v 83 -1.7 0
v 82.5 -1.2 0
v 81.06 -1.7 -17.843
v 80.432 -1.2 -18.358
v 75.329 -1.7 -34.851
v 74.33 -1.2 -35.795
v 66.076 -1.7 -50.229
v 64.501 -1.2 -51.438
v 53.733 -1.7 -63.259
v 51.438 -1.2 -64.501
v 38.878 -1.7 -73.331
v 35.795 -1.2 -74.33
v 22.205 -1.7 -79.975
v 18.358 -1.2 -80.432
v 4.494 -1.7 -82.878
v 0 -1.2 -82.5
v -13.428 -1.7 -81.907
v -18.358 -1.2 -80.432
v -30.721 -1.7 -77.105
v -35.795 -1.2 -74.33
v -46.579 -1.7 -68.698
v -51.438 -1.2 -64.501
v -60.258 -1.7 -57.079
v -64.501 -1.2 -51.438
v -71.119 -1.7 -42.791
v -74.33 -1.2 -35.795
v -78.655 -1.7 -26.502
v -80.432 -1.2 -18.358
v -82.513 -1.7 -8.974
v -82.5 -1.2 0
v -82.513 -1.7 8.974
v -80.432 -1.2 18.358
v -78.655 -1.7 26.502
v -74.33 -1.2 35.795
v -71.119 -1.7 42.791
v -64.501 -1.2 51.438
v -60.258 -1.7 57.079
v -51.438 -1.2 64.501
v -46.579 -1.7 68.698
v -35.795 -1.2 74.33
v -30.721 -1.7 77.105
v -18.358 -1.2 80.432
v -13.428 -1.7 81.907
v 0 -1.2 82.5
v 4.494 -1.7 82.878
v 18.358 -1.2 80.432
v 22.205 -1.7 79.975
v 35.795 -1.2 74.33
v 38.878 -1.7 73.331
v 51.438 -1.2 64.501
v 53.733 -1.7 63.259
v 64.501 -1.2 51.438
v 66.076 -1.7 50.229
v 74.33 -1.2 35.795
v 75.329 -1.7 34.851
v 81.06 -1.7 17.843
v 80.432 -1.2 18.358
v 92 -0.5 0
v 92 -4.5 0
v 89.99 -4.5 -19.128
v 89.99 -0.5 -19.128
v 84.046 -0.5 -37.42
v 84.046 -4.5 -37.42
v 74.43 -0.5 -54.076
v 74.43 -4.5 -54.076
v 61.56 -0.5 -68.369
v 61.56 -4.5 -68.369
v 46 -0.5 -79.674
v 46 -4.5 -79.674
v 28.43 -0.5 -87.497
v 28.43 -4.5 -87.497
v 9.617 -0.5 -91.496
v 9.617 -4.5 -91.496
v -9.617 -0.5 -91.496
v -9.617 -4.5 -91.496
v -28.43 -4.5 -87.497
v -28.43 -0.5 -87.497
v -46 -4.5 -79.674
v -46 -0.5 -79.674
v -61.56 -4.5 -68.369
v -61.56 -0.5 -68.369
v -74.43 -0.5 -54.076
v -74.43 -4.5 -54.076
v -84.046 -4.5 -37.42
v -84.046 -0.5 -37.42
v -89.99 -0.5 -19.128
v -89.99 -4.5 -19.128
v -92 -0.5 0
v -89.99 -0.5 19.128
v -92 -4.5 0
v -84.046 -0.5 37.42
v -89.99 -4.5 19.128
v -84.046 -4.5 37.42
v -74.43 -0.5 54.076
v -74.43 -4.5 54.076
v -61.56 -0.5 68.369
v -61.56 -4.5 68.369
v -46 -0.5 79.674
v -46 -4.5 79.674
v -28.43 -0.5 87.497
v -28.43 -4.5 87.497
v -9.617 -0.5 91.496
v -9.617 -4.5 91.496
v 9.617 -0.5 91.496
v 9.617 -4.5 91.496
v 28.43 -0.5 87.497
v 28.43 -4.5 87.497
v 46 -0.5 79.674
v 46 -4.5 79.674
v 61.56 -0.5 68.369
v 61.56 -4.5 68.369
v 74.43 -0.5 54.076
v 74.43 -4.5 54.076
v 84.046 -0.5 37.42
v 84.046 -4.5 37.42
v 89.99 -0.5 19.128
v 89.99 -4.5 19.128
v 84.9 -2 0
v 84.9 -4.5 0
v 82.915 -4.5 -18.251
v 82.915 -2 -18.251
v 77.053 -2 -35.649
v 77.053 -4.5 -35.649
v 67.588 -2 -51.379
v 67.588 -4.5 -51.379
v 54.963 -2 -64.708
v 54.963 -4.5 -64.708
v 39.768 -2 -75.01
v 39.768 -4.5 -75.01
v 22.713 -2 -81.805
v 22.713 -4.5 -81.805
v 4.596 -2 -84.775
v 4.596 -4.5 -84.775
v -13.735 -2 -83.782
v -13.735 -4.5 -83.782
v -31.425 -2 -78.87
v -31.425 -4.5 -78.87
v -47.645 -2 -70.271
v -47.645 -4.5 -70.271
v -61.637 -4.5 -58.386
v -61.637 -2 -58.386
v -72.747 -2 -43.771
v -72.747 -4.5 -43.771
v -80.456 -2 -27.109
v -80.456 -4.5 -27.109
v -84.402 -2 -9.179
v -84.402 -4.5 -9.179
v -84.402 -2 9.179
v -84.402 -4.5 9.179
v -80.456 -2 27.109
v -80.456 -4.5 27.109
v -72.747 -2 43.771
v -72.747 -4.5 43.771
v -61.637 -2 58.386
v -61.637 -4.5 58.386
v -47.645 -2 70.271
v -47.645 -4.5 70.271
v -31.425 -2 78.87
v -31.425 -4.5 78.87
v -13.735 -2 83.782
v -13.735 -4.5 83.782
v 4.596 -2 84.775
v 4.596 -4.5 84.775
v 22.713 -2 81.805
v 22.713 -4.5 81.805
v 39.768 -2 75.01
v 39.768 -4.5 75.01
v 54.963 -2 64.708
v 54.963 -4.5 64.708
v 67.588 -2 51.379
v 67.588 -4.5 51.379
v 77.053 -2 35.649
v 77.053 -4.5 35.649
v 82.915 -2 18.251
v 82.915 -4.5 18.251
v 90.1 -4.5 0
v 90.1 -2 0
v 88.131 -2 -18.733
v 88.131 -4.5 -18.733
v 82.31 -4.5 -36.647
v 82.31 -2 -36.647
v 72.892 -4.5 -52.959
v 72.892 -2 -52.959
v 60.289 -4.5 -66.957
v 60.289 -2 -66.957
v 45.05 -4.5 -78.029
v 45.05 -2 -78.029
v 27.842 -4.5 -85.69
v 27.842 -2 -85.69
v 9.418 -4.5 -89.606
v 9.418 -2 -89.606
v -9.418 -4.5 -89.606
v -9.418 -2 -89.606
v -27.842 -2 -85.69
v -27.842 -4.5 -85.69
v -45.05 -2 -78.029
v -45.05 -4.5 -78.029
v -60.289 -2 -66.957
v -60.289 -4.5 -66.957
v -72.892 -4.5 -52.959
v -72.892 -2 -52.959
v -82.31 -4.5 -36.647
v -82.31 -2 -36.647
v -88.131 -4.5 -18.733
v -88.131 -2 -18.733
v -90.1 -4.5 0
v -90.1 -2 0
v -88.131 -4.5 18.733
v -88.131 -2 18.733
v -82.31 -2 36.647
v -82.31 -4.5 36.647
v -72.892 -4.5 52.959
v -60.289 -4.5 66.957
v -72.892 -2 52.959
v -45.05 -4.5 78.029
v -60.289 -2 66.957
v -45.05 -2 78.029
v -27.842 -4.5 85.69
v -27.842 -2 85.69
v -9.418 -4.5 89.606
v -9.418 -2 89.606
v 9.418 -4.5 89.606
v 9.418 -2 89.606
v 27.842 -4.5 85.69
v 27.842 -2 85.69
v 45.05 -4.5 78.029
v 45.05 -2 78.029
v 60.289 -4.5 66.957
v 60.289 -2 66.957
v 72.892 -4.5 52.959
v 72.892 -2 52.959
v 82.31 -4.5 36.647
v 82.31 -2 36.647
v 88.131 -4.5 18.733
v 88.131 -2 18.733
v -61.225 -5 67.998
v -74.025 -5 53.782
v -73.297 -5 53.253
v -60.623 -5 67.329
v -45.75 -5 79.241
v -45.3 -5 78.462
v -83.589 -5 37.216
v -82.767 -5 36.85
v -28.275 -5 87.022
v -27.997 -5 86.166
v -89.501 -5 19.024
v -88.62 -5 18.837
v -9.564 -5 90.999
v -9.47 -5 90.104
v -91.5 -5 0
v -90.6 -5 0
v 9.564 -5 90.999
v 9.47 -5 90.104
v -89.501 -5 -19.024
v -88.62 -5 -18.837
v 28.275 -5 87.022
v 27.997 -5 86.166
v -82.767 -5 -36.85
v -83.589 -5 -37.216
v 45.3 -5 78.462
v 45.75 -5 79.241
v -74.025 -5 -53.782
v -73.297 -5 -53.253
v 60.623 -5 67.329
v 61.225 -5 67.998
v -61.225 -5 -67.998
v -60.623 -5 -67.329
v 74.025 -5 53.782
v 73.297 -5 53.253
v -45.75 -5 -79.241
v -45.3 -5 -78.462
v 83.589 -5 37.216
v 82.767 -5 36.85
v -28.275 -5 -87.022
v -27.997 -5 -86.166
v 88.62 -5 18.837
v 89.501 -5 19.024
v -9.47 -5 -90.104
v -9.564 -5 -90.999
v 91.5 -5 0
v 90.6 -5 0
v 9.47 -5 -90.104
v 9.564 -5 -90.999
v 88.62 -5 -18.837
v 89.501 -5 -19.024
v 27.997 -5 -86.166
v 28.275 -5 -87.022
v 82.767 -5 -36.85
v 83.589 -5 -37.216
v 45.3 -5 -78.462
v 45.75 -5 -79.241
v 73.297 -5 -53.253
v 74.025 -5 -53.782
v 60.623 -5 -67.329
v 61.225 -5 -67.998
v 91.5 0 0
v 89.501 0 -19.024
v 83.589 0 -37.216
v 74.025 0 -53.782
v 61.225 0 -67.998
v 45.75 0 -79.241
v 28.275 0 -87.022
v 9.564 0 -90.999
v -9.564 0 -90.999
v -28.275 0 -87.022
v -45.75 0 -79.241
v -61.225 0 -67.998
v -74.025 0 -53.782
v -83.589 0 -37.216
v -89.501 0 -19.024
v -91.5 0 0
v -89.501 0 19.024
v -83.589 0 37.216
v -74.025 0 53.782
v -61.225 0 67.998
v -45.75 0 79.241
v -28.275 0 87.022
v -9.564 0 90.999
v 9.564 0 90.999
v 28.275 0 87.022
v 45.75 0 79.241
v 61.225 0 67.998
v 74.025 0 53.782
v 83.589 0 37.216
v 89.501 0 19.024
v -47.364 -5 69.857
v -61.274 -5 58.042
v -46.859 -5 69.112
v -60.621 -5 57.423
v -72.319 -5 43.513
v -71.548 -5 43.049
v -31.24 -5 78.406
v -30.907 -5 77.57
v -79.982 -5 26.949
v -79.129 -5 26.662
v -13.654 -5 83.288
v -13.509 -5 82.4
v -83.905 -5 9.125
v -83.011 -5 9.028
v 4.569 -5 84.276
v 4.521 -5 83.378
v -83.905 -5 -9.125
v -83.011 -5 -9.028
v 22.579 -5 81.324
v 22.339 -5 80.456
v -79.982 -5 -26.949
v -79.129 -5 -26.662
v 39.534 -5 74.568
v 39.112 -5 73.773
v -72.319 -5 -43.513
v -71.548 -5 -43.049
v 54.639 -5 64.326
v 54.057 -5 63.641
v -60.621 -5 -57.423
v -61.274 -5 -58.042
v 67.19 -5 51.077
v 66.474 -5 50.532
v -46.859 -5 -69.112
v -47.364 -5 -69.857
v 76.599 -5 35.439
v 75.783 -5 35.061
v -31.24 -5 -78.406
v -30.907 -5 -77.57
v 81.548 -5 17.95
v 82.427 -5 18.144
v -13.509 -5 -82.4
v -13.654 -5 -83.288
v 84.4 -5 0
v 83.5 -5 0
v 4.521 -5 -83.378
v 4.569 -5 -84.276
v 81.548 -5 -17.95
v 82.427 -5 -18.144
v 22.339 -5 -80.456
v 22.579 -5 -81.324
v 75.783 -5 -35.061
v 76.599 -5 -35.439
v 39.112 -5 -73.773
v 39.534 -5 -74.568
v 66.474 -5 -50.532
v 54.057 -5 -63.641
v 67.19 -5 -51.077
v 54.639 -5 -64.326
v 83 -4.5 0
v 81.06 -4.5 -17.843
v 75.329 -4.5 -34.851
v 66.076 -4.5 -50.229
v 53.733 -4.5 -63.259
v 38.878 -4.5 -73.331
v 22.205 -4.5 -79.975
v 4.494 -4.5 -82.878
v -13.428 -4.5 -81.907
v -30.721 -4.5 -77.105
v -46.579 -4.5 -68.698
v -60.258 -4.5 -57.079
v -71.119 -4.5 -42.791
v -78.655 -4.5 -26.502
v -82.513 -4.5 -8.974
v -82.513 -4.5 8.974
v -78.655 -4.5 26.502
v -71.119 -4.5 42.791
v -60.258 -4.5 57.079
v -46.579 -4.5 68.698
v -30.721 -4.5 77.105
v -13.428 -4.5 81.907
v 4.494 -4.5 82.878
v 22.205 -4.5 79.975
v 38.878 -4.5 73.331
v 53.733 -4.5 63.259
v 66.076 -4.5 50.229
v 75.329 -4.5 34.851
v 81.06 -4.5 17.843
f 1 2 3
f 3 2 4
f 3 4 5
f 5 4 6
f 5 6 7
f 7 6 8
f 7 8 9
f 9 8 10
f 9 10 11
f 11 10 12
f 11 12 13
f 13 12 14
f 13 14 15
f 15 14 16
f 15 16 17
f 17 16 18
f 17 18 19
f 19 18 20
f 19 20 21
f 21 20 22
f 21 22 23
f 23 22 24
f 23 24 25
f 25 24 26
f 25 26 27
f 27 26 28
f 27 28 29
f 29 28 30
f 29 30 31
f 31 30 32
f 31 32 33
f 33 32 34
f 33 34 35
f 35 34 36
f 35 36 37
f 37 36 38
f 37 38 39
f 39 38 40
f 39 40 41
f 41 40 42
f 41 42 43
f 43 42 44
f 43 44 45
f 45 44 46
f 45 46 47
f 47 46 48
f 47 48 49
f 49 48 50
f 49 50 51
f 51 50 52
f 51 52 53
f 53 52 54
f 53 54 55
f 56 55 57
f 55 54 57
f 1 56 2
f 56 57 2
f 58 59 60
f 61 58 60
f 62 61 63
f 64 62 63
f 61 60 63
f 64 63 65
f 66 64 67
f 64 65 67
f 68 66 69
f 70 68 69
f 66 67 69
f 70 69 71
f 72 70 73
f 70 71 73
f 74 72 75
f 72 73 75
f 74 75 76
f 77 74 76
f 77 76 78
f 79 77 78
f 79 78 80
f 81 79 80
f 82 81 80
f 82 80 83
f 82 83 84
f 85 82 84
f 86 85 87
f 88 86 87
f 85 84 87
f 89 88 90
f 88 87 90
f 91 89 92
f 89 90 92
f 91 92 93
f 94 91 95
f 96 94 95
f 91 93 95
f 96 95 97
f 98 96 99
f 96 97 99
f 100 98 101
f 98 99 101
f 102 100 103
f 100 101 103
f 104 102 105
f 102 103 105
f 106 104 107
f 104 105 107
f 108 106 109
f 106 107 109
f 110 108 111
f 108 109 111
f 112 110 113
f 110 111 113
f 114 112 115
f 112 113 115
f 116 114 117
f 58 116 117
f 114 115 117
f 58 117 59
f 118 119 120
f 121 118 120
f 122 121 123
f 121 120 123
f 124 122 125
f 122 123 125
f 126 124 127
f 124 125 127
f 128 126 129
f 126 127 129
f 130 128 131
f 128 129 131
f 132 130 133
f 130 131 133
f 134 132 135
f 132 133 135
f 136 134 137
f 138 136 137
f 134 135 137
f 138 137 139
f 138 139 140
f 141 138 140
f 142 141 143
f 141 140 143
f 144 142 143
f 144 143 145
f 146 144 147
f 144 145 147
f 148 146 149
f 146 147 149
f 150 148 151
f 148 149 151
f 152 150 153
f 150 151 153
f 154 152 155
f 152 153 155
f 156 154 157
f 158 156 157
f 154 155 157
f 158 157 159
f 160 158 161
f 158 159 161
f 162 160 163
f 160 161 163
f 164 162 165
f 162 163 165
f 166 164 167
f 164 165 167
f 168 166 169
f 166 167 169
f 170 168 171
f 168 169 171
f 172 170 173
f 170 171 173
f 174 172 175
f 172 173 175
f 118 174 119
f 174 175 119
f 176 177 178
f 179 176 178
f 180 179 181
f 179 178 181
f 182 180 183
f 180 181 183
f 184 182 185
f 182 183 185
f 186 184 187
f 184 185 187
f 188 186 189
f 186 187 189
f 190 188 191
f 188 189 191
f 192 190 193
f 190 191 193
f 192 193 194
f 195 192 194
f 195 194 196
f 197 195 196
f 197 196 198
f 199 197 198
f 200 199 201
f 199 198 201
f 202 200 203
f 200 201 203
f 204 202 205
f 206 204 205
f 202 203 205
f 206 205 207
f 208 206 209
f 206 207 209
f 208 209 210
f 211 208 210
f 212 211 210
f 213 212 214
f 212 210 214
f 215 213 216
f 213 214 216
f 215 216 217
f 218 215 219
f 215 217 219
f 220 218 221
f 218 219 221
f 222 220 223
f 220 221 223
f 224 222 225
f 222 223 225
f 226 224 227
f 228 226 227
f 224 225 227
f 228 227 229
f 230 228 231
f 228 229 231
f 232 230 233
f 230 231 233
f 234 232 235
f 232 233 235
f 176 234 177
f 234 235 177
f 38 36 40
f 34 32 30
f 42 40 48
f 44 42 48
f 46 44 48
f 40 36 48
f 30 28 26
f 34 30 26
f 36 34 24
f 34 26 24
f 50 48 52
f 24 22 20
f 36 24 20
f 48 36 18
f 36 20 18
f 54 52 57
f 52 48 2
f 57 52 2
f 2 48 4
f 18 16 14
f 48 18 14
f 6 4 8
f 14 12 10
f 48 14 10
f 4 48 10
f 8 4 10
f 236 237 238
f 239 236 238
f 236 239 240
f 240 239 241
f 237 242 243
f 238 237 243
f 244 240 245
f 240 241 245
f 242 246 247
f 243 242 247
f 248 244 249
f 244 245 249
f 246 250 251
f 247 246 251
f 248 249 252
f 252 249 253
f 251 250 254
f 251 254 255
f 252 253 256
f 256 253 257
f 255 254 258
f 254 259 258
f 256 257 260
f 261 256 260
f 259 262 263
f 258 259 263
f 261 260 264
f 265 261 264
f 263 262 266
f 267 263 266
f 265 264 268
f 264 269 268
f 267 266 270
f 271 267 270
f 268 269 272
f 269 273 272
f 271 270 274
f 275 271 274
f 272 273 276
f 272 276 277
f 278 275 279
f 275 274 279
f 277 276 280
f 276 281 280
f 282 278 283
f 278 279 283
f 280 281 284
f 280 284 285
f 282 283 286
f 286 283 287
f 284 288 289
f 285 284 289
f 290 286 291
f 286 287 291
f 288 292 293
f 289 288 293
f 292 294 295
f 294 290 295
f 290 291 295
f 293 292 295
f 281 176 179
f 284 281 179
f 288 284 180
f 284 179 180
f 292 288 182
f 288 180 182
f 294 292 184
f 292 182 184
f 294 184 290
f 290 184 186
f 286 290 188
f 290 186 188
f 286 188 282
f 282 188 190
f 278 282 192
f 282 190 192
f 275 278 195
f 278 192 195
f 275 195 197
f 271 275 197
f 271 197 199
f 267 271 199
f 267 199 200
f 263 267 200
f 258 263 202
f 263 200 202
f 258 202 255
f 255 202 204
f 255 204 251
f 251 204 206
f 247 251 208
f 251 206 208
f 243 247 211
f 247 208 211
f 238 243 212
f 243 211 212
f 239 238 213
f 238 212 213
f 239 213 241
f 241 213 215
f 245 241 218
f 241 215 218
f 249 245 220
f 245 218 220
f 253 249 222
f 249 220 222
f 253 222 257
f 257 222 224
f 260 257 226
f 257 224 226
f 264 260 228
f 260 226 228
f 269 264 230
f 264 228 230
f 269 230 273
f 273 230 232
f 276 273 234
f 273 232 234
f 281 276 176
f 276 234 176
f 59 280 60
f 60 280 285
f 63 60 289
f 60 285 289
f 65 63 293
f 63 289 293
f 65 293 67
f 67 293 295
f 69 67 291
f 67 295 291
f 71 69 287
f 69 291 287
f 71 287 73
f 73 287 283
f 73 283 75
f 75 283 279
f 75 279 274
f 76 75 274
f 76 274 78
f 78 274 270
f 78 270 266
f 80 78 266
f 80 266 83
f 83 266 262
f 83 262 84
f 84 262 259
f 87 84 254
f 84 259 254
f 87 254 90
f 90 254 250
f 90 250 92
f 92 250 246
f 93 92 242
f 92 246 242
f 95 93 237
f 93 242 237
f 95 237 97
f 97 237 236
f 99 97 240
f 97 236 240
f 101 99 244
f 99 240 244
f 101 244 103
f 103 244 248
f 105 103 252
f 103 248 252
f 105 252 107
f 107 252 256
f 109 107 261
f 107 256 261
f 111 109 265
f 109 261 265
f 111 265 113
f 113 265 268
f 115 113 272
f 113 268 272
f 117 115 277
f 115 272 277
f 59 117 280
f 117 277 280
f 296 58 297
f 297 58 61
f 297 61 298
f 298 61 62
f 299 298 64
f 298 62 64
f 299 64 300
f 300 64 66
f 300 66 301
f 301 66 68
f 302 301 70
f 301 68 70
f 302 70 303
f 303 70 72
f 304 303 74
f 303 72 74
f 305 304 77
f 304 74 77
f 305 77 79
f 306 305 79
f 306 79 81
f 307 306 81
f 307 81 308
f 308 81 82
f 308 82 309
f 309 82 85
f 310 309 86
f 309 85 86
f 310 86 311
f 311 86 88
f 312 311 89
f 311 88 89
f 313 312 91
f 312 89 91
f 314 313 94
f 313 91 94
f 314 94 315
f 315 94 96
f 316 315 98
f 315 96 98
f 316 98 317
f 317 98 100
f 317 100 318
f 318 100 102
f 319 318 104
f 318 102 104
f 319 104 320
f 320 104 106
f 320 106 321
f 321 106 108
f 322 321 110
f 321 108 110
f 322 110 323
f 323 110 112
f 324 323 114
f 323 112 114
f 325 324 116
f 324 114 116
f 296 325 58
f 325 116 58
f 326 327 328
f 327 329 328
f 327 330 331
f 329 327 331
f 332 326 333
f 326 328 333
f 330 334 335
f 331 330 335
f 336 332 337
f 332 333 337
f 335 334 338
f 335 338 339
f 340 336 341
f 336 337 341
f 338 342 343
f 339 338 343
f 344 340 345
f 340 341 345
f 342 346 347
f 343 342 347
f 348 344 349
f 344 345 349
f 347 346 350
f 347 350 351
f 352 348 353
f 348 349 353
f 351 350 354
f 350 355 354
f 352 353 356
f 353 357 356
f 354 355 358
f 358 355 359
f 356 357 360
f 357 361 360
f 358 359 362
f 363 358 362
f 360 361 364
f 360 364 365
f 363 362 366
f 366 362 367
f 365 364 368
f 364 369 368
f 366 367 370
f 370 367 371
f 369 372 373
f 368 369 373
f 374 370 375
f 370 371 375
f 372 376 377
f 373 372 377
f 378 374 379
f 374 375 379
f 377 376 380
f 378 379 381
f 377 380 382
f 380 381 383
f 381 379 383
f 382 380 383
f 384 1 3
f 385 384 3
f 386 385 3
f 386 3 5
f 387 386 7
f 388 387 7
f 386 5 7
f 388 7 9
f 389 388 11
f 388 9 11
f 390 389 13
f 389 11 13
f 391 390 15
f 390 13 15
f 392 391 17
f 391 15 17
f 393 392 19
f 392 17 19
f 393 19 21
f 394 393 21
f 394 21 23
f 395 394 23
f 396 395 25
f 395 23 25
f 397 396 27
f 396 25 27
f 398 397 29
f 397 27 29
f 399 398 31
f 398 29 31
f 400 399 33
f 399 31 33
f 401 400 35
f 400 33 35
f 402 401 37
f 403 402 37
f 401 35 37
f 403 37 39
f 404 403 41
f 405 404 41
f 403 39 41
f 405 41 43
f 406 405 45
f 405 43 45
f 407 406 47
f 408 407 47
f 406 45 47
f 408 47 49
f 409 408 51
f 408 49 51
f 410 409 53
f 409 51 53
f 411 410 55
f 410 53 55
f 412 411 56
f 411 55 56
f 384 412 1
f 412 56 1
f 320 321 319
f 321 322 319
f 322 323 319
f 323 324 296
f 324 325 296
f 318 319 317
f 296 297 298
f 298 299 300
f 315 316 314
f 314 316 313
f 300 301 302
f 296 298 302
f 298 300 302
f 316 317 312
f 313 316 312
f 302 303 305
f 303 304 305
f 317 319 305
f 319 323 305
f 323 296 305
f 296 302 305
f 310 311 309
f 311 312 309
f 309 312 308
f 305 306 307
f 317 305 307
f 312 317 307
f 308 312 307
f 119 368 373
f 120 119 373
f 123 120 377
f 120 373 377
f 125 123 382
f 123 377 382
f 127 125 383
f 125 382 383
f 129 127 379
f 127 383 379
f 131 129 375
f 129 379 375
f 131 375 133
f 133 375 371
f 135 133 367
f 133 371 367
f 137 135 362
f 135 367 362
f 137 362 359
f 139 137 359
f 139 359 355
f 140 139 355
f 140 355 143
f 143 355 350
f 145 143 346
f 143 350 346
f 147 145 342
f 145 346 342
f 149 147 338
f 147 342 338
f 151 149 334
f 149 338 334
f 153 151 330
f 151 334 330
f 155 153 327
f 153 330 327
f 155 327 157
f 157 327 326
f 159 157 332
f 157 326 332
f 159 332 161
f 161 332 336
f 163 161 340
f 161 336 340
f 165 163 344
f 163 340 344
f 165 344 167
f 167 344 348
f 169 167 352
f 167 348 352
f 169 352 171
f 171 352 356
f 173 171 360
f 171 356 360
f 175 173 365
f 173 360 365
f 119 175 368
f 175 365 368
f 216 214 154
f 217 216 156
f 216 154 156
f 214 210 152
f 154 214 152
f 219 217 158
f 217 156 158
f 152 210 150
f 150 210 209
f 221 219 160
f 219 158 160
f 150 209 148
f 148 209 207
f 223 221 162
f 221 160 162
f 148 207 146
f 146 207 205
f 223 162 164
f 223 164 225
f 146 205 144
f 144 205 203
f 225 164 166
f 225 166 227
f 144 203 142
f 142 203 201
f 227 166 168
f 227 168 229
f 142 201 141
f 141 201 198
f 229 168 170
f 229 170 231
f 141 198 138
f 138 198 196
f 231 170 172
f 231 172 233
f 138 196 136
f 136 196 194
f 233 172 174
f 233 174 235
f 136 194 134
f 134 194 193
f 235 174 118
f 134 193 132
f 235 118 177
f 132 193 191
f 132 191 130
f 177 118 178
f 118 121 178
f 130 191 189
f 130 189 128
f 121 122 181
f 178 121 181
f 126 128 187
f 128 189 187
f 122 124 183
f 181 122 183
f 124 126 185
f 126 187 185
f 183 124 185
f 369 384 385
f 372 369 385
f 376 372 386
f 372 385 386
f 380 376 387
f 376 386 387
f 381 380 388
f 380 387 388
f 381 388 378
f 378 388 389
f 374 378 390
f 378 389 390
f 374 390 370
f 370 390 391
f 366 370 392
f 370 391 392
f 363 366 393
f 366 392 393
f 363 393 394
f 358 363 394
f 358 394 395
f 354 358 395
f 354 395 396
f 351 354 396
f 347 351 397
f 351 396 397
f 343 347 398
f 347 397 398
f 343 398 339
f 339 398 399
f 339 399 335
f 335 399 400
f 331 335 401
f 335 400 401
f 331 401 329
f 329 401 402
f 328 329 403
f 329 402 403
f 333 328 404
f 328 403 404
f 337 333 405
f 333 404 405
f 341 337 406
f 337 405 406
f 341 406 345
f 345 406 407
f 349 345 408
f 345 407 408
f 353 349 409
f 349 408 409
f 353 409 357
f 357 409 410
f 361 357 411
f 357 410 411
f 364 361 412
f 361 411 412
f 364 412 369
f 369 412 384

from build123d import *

# Parameters (mm, degrees)
CHAMFER1_SIZE = 0.5


with BuildPart() as part:
    # Sketch1 → Revolve1 (revolve)
    with BuildSketch(Plane.XY):
        Polygon((0, 0), (92, 0), (92, -5), (90.1, -5), (90.1, -2), (84.9, -2), (84.9, -5), (83, -5), (83, -1.2), (0, -1.2), align=None)
    revolve(axis=Axis((0, -1.2, 0), (0, 1, 0)))

    # Chamfer1
    chamfer1_edges = [part.edges().sort_by_distance(p)[0] for p in [
        (-92, -5, 0),
        (-92, 0, 0),
        (-83, -1.2, 0),
        (-83, -5, 0),
        (-84.9, -5, 0),
        (-90.1, -5, 0),
    ]]
    chamfer(chamfer1_edges, length=CHAMFER1_SIZE)


solid = part.part
